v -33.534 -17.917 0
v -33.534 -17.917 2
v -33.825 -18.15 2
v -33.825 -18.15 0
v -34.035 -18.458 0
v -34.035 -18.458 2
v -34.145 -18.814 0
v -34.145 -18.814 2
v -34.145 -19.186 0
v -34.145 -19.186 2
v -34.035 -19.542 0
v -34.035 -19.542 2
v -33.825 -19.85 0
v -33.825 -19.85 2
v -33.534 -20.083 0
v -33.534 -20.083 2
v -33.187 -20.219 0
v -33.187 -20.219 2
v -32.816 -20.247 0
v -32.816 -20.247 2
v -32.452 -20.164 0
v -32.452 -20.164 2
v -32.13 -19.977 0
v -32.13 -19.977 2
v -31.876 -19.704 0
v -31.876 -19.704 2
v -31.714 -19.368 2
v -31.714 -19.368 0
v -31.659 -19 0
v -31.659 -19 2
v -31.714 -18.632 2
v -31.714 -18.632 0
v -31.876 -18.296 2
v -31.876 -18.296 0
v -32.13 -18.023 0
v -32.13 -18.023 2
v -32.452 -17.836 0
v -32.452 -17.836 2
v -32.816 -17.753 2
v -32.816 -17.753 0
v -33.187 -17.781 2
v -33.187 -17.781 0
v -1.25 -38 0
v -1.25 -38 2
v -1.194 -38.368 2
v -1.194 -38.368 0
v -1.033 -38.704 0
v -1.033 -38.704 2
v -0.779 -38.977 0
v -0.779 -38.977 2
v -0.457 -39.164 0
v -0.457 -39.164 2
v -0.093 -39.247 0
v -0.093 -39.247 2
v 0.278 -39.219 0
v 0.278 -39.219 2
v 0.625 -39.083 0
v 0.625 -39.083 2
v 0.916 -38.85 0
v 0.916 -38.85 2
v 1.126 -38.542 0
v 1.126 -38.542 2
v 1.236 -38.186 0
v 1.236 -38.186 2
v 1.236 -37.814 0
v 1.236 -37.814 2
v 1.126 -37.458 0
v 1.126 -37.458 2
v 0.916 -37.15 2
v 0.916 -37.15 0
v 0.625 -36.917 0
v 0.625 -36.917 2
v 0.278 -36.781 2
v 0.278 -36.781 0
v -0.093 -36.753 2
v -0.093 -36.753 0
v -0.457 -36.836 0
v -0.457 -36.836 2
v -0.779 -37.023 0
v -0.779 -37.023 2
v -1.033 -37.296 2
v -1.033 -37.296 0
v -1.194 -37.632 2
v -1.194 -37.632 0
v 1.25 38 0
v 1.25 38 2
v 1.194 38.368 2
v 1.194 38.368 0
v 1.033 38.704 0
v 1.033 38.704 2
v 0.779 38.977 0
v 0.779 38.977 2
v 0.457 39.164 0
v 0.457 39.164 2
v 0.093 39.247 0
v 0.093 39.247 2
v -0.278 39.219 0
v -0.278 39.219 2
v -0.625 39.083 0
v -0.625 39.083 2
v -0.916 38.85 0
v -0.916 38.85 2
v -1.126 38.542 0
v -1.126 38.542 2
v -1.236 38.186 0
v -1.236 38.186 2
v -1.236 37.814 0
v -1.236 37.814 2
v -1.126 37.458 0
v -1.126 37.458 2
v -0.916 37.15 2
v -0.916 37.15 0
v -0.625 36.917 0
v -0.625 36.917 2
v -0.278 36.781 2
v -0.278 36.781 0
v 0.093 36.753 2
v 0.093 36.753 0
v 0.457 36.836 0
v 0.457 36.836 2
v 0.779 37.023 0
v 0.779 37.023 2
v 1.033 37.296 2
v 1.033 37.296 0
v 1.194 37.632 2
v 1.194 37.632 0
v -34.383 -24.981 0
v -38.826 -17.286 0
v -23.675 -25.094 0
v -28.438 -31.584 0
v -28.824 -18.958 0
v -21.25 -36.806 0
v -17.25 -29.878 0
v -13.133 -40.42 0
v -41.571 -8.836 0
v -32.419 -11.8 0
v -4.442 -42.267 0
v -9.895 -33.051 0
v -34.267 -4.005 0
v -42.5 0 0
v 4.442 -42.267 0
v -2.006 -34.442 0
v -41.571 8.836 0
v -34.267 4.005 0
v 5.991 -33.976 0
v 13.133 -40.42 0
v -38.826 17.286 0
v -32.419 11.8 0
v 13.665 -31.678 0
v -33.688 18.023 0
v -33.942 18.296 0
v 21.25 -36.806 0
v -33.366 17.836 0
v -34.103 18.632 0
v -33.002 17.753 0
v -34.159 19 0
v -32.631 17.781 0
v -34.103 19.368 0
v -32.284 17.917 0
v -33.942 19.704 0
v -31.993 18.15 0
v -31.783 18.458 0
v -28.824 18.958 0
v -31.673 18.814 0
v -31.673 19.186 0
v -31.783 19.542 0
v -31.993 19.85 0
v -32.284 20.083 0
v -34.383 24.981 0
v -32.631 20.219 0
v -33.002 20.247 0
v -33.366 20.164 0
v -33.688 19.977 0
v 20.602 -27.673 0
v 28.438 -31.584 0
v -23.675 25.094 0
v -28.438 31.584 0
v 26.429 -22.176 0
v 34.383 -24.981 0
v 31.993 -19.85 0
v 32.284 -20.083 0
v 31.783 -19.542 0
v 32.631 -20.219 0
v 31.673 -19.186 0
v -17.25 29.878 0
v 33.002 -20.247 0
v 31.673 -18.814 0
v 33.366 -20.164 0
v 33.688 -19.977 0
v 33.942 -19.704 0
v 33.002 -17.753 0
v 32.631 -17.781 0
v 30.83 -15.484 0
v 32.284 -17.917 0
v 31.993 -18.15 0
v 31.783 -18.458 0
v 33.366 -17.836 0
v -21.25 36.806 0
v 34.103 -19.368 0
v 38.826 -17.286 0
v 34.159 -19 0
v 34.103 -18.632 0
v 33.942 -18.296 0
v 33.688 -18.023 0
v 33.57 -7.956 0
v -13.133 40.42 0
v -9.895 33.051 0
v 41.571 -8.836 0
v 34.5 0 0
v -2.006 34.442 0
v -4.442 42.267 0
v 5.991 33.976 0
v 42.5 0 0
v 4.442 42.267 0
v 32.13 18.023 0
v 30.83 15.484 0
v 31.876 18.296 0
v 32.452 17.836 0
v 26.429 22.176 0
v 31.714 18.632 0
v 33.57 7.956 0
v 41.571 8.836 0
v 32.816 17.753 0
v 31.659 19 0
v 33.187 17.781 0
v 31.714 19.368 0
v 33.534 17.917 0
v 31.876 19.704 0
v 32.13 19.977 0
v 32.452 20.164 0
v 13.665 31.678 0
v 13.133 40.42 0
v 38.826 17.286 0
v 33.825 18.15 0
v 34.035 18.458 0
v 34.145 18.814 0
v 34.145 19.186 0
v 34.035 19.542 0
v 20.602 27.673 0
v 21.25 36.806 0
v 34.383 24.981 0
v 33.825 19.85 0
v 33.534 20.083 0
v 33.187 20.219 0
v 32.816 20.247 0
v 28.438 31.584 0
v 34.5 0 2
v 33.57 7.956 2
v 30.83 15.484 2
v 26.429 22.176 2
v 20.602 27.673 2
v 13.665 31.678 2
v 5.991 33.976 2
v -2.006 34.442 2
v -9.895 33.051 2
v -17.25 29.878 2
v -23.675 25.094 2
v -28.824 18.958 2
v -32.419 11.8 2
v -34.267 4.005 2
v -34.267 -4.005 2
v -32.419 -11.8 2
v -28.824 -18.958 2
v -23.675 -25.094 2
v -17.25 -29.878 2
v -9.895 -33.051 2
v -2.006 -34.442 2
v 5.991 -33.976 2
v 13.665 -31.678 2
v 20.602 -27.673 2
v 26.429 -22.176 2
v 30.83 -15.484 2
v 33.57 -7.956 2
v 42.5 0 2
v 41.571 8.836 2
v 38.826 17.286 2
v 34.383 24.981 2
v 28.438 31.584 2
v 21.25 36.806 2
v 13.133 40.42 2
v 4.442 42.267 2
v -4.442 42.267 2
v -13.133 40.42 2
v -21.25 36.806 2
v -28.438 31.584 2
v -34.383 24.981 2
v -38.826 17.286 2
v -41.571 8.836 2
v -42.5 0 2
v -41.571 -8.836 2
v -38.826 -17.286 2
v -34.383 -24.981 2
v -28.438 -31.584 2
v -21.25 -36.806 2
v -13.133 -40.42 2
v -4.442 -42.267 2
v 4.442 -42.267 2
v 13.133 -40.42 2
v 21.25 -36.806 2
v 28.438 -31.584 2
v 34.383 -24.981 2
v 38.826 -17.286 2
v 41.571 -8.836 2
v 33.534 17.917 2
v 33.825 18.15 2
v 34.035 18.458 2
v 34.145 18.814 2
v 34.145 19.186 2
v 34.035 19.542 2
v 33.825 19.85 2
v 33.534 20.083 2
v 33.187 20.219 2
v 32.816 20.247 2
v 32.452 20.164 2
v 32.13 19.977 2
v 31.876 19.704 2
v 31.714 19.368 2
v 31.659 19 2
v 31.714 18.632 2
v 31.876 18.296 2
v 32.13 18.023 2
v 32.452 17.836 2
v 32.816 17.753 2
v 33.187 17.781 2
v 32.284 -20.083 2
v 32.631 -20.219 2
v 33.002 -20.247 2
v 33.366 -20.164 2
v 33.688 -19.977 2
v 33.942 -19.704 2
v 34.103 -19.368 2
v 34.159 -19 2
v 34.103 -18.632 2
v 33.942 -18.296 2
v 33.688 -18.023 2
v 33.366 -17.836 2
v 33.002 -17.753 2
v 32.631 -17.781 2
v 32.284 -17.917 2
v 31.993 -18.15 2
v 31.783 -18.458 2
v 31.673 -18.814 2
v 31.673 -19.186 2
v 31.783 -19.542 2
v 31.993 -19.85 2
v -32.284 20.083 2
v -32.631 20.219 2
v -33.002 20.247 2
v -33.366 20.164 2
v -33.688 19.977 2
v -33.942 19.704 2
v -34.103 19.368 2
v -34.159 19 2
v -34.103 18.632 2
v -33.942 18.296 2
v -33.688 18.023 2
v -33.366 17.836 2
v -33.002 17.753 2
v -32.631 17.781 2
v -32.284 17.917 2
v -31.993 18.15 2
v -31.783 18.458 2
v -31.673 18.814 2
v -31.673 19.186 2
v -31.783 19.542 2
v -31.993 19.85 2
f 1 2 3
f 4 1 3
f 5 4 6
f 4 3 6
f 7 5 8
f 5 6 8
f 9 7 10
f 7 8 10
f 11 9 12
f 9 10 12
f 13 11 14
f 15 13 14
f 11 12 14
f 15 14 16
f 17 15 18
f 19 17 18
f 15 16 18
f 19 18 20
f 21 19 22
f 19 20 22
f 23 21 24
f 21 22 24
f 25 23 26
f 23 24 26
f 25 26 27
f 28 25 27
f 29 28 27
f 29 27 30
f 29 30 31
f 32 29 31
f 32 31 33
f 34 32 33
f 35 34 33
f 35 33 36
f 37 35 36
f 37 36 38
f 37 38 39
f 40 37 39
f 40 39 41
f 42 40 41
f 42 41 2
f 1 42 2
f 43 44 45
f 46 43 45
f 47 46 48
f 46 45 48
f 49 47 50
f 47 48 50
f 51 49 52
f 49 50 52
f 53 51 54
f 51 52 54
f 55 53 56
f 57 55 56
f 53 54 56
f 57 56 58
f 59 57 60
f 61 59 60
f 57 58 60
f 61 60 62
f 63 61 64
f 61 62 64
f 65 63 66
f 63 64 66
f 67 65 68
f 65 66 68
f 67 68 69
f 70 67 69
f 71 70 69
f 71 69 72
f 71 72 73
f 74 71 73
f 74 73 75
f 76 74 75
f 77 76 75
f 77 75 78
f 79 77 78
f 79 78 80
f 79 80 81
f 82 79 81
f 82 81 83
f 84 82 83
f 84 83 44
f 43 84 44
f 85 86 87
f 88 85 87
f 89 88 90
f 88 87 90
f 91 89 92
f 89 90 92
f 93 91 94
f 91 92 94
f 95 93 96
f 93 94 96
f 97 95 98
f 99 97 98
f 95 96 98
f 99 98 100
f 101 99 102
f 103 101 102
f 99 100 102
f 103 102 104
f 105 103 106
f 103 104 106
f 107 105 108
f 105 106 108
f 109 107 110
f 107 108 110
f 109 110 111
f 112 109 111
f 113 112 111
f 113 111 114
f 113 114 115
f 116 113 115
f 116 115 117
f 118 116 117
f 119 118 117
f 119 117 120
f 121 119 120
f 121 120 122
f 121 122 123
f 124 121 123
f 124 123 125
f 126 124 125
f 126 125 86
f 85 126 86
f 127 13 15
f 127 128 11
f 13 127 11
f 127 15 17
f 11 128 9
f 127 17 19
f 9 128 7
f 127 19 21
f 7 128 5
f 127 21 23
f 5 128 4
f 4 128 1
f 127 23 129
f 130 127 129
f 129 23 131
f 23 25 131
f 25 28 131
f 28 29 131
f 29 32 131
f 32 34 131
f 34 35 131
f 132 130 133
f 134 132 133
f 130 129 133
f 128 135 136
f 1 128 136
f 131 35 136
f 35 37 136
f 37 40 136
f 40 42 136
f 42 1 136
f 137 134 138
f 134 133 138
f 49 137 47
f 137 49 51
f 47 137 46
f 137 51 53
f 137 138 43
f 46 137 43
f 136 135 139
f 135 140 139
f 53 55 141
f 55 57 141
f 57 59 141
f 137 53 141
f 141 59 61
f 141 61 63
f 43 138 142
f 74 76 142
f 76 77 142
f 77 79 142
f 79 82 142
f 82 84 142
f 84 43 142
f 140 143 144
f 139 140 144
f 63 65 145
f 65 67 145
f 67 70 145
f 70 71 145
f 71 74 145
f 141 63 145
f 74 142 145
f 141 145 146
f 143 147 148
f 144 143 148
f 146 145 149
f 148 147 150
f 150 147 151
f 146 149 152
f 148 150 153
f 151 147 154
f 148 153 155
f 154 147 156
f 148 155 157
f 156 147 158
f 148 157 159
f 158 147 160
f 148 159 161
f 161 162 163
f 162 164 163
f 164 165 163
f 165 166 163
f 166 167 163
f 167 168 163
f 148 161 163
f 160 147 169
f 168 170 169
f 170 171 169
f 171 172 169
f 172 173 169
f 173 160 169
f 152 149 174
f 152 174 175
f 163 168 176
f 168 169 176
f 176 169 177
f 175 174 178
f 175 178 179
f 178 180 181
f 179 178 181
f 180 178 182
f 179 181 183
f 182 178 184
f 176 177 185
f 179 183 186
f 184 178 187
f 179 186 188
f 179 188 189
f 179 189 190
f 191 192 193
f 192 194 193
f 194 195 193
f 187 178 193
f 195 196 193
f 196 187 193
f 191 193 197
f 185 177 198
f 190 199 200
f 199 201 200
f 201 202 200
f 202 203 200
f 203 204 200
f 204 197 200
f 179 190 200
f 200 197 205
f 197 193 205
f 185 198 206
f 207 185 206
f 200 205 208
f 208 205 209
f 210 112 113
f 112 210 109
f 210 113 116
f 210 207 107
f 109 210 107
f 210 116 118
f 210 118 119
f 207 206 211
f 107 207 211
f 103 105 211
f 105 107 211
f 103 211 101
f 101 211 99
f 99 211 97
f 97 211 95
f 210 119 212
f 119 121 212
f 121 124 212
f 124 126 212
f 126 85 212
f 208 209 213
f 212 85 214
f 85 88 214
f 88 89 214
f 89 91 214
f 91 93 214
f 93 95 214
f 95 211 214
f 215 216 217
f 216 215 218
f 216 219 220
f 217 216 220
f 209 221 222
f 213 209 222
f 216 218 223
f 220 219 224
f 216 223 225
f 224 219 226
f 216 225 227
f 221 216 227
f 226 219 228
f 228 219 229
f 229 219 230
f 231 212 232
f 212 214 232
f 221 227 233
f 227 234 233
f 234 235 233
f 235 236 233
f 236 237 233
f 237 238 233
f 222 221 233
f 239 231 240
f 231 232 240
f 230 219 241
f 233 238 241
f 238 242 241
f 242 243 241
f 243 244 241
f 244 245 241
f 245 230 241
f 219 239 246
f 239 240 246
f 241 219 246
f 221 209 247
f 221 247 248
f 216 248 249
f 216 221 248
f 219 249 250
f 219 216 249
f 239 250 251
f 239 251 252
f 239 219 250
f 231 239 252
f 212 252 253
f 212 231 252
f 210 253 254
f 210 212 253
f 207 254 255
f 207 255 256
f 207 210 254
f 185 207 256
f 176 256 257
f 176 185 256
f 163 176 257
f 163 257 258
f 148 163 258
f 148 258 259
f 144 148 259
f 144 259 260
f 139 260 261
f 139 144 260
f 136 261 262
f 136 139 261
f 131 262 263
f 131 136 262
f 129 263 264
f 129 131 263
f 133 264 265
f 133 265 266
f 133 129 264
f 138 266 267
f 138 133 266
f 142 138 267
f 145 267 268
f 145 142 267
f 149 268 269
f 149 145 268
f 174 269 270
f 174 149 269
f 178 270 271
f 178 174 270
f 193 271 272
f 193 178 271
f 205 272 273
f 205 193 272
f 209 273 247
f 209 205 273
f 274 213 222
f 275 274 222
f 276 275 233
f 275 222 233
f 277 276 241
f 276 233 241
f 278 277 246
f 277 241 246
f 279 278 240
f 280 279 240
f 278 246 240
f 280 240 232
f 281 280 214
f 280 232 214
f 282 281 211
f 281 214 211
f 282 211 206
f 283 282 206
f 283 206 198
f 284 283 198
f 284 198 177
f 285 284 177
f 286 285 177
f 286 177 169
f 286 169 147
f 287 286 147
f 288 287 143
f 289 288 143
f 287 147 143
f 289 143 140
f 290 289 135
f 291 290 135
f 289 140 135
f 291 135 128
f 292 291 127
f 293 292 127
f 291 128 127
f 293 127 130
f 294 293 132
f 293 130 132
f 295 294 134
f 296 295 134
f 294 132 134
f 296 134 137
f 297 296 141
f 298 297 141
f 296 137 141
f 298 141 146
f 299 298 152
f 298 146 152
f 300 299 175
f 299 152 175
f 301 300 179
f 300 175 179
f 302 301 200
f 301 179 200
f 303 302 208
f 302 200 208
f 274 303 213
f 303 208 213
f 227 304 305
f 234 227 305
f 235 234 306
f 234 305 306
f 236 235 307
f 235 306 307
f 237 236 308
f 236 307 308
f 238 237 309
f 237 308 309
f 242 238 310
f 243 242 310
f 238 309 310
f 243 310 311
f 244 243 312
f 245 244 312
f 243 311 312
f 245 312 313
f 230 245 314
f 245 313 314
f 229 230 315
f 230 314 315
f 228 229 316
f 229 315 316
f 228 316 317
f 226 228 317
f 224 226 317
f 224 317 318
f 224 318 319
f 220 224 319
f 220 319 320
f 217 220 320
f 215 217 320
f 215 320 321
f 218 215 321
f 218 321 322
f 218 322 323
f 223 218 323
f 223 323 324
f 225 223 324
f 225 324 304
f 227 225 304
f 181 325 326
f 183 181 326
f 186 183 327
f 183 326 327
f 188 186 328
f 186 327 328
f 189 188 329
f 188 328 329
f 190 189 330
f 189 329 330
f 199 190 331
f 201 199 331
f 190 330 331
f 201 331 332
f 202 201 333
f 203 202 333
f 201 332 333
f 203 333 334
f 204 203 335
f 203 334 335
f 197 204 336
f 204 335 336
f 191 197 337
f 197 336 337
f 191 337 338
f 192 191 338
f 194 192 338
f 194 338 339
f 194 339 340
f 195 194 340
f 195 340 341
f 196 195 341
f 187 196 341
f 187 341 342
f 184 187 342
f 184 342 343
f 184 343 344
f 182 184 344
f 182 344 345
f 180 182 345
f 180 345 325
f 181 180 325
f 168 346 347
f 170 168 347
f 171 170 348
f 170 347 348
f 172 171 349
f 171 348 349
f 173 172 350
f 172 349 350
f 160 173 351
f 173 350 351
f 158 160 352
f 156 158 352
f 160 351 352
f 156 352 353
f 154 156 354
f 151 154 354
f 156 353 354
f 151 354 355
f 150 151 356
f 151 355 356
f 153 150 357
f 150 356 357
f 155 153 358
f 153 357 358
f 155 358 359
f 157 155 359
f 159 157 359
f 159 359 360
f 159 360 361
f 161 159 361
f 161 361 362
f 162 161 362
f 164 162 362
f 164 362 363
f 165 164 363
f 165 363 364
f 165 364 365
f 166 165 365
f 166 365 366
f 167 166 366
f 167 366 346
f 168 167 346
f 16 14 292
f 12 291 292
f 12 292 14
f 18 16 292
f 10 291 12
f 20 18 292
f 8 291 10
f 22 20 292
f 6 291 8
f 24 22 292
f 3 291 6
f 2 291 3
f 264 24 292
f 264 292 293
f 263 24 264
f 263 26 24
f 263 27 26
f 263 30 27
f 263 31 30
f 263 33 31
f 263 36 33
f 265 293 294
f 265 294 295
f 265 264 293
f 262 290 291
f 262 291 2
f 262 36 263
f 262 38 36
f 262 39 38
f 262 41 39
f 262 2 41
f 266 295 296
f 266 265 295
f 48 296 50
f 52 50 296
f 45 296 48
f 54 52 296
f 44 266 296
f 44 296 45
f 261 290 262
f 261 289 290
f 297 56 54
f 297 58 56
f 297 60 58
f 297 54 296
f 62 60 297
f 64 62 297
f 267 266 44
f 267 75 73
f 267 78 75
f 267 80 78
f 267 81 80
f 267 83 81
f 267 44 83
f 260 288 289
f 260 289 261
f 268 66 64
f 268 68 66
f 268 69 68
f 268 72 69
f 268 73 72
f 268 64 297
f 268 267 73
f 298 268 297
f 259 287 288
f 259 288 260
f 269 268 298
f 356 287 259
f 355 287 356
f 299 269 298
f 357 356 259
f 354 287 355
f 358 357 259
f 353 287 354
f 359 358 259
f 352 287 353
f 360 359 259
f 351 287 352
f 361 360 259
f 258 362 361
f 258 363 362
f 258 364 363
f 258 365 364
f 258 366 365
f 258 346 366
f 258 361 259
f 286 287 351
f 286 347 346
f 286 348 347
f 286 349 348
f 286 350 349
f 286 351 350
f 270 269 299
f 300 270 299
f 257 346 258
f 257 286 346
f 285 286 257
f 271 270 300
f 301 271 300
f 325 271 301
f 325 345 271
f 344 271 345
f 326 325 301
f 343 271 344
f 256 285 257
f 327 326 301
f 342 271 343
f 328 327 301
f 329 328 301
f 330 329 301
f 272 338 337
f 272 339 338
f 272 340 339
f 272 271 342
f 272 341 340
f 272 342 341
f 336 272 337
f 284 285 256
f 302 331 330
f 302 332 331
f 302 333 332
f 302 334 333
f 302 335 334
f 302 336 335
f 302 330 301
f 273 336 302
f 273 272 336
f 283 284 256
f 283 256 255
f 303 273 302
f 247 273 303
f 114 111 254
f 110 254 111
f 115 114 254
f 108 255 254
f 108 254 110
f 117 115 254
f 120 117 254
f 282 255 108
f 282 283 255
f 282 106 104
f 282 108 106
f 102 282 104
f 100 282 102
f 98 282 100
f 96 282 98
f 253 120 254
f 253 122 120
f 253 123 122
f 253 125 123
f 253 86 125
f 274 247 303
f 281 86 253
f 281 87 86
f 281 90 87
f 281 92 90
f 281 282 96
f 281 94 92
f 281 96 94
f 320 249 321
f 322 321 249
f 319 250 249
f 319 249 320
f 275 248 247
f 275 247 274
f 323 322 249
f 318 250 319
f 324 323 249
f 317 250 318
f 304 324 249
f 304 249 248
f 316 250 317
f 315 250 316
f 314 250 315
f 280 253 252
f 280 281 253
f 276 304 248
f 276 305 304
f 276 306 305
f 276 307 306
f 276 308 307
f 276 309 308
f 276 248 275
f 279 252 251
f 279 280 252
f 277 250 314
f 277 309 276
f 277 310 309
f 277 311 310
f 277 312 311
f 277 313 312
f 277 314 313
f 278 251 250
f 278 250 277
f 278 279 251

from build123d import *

# Parameters (mm, degrees)
SKETCH_1_R                 = 42.5
SKETCH_1_R_2               = 34.5
EXTRUDE_336_DEPTH          = 2
SKETCH_3_R                 = 1.25
CUT_EXTRUDE_486_DEPTH      = 61.137342808
PATTERN_CIRCULAR_525_COUNT = 6


with BuildPart() as part:
    # Эскиз1 → Extrude 336 (new body)
    with BuildSketch(Plane.XY):
        Circle(SKETCH_1_R)
        Circle(SKETCH_1_R_2, mode=Mode.SUBTRACT)
    extrude(amount=EXTRUDE_336_DEPTH)

    # Эскиз3 → Cut-Extrude 486 (cut, through all)
    with BuildSketch(Plane.XY.offset(2)):
        with Locations((0, 38)):
            Circle(SKETCH_3_R)
    cut_extrude_486 = extrude(amount=-CUT_EXTRUDE_486_DEPTH, mode=Mode.SUBTRACT)

    # Pattern Circular 525: Cut-Extrude 486 ×6 about axis
    pattern_circular_525_axis = Axis((0, 0, 0), (0, 0, 1))
    for i in range(1, PATTERN_CIRCULAR_525_COUNT):
        add(cut_extrude_486.rotate(pattern_circular_525_axis, i * 360 / PATTERN_CIRCULAR_525_COUNT), mode=Mode.SUBTRACT)


solid = part.part
